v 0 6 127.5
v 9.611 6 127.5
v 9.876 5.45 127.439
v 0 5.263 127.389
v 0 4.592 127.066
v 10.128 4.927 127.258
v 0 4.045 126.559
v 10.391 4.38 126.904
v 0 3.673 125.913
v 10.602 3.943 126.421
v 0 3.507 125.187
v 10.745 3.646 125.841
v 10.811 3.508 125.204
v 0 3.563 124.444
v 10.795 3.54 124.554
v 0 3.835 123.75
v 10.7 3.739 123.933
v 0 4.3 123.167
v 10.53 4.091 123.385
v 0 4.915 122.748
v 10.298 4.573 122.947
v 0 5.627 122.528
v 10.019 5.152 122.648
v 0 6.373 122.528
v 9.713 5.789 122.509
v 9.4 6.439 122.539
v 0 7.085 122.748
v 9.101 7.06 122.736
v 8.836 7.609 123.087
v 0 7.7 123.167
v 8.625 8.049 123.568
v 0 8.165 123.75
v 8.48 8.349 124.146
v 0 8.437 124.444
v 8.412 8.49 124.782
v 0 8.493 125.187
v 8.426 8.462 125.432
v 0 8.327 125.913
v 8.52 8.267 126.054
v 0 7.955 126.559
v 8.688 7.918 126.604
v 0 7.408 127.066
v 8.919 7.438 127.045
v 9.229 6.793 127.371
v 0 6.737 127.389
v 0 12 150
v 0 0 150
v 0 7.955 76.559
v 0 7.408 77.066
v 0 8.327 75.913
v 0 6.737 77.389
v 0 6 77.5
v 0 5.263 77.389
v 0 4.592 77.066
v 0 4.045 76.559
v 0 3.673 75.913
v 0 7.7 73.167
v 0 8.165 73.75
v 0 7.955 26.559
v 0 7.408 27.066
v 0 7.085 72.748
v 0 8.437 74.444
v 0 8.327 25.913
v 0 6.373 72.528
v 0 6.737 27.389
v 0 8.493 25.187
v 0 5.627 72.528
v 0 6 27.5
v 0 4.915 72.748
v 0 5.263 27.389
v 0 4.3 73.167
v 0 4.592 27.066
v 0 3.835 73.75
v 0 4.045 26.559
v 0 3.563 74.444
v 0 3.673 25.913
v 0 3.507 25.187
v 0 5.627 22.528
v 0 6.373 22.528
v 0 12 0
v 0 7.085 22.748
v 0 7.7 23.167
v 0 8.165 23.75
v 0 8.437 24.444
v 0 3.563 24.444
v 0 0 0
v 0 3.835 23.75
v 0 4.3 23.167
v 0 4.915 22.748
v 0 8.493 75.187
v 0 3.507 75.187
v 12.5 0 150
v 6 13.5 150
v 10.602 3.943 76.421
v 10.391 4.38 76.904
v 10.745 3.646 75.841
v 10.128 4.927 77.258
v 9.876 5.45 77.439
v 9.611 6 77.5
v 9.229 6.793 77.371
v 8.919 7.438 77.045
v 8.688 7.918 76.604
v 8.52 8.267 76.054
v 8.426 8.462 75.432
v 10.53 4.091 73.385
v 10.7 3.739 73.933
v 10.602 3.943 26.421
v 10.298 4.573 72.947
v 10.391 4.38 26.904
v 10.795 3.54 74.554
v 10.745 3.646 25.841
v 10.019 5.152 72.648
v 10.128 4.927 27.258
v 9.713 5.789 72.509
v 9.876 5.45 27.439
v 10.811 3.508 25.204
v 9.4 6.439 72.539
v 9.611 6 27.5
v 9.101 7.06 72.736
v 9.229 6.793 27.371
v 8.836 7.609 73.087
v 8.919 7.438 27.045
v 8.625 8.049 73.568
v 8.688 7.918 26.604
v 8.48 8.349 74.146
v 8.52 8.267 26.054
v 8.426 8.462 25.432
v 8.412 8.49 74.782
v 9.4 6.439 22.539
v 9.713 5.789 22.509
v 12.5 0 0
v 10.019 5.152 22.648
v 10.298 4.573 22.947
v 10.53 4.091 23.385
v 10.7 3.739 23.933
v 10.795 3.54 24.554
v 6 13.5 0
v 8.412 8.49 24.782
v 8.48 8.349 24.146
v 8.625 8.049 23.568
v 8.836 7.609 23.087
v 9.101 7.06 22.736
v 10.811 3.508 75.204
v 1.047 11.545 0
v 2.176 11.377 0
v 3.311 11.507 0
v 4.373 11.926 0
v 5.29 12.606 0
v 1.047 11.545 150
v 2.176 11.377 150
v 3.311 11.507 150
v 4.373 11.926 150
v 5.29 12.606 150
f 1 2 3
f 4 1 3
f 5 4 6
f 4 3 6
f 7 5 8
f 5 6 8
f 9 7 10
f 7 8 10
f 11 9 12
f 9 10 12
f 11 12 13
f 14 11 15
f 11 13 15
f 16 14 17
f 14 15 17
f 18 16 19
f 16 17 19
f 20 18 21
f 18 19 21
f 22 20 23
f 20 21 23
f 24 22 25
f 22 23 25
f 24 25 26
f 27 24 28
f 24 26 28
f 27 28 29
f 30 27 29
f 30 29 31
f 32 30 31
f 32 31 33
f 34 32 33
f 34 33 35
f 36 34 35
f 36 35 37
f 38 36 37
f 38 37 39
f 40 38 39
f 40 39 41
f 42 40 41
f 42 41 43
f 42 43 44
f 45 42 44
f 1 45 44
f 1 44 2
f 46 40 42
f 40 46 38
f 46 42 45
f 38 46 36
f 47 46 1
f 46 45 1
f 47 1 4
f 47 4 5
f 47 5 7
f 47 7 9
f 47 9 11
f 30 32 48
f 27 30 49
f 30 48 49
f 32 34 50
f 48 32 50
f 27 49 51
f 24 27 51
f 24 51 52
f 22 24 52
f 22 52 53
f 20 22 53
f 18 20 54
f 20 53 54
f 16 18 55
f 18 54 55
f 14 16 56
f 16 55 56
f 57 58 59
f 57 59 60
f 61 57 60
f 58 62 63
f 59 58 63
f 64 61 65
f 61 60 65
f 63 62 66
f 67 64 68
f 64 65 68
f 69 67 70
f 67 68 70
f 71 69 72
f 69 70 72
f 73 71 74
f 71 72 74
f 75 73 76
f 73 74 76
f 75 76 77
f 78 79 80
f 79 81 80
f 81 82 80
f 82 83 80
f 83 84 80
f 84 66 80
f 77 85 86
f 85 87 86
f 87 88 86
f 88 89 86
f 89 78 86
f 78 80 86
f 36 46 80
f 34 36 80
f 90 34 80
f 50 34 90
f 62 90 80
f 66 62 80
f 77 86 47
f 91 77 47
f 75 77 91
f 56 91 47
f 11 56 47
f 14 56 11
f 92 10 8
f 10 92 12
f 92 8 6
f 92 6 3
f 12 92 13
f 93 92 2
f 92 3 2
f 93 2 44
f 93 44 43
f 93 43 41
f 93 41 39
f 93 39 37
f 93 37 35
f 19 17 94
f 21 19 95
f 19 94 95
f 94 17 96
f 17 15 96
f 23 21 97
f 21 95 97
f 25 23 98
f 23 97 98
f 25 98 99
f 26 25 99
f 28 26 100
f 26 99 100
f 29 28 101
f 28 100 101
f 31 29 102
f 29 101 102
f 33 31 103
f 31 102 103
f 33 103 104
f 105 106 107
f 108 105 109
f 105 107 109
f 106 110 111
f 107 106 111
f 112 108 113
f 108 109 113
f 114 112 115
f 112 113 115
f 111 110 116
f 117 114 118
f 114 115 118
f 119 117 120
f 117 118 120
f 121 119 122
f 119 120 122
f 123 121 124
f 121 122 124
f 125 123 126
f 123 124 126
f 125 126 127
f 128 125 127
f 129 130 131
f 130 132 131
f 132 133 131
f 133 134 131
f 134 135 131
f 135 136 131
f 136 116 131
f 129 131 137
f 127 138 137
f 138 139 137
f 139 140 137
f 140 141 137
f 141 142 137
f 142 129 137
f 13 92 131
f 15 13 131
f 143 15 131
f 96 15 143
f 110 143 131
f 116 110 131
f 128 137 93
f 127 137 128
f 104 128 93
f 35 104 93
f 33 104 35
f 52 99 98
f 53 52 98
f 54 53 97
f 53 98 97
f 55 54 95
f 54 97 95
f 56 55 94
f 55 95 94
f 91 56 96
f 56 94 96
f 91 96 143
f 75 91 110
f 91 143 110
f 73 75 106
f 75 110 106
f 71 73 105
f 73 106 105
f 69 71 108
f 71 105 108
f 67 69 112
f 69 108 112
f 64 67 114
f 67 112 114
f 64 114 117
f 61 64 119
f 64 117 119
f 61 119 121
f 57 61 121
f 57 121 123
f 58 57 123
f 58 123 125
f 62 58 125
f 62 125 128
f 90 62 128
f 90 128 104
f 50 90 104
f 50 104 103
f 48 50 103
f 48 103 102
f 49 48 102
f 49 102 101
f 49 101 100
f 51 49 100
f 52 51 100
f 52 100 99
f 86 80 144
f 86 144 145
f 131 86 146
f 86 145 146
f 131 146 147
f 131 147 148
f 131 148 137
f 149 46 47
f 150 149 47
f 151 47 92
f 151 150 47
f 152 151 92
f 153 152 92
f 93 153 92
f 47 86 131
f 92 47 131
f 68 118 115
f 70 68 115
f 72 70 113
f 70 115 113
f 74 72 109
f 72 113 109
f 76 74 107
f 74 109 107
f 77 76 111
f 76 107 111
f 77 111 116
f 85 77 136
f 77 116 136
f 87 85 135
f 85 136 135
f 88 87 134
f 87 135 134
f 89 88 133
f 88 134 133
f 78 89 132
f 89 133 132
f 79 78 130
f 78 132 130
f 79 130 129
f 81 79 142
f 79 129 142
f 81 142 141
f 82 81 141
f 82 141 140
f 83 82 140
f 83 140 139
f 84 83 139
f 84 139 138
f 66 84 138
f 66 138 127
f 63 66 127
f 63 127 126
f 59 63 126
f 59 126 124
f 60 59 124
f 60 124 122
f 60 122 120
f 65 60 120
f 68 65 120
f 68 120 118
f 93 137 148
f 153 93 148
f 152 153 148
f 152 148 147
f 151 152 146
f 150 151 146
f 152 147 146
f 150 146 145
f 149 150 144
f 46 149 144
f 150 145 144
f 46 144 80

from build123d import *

# Parameters (mm, degrees)
BOSS_EXTRU_1_DEPTH = 150
TROU_TARAUD_M63_D  = 5


with BuildPart() as part:
    # Esquisse1 → Boss.-Extru.1 (new body)
    with BuildSketch(Plane.XY):
        with BuildLine():
            Line((0, 0), (12.5, 0))
            Line((12.5, 0), (6, 13.5))
            ThreePointArc((6, 13.5), (3.310660172, 11.507359313), (0, 12))
            Line((0, 12), (0, 0))
        make_face()
    extrude(amount=BOSS_EXTRU_1_DEPTH)

    # Trou taraudé M63 (through all)
    with Locations(Plane(origin=(0, 6, 25), x_dir=(0, 0, -1), z_dir=(-1, 0, 0))):
        with Locations((0, 0), (-50, 0), (-100, 0)):
            Hole(TROU_TARAUD_M63_D / 2)


solid = part.part
